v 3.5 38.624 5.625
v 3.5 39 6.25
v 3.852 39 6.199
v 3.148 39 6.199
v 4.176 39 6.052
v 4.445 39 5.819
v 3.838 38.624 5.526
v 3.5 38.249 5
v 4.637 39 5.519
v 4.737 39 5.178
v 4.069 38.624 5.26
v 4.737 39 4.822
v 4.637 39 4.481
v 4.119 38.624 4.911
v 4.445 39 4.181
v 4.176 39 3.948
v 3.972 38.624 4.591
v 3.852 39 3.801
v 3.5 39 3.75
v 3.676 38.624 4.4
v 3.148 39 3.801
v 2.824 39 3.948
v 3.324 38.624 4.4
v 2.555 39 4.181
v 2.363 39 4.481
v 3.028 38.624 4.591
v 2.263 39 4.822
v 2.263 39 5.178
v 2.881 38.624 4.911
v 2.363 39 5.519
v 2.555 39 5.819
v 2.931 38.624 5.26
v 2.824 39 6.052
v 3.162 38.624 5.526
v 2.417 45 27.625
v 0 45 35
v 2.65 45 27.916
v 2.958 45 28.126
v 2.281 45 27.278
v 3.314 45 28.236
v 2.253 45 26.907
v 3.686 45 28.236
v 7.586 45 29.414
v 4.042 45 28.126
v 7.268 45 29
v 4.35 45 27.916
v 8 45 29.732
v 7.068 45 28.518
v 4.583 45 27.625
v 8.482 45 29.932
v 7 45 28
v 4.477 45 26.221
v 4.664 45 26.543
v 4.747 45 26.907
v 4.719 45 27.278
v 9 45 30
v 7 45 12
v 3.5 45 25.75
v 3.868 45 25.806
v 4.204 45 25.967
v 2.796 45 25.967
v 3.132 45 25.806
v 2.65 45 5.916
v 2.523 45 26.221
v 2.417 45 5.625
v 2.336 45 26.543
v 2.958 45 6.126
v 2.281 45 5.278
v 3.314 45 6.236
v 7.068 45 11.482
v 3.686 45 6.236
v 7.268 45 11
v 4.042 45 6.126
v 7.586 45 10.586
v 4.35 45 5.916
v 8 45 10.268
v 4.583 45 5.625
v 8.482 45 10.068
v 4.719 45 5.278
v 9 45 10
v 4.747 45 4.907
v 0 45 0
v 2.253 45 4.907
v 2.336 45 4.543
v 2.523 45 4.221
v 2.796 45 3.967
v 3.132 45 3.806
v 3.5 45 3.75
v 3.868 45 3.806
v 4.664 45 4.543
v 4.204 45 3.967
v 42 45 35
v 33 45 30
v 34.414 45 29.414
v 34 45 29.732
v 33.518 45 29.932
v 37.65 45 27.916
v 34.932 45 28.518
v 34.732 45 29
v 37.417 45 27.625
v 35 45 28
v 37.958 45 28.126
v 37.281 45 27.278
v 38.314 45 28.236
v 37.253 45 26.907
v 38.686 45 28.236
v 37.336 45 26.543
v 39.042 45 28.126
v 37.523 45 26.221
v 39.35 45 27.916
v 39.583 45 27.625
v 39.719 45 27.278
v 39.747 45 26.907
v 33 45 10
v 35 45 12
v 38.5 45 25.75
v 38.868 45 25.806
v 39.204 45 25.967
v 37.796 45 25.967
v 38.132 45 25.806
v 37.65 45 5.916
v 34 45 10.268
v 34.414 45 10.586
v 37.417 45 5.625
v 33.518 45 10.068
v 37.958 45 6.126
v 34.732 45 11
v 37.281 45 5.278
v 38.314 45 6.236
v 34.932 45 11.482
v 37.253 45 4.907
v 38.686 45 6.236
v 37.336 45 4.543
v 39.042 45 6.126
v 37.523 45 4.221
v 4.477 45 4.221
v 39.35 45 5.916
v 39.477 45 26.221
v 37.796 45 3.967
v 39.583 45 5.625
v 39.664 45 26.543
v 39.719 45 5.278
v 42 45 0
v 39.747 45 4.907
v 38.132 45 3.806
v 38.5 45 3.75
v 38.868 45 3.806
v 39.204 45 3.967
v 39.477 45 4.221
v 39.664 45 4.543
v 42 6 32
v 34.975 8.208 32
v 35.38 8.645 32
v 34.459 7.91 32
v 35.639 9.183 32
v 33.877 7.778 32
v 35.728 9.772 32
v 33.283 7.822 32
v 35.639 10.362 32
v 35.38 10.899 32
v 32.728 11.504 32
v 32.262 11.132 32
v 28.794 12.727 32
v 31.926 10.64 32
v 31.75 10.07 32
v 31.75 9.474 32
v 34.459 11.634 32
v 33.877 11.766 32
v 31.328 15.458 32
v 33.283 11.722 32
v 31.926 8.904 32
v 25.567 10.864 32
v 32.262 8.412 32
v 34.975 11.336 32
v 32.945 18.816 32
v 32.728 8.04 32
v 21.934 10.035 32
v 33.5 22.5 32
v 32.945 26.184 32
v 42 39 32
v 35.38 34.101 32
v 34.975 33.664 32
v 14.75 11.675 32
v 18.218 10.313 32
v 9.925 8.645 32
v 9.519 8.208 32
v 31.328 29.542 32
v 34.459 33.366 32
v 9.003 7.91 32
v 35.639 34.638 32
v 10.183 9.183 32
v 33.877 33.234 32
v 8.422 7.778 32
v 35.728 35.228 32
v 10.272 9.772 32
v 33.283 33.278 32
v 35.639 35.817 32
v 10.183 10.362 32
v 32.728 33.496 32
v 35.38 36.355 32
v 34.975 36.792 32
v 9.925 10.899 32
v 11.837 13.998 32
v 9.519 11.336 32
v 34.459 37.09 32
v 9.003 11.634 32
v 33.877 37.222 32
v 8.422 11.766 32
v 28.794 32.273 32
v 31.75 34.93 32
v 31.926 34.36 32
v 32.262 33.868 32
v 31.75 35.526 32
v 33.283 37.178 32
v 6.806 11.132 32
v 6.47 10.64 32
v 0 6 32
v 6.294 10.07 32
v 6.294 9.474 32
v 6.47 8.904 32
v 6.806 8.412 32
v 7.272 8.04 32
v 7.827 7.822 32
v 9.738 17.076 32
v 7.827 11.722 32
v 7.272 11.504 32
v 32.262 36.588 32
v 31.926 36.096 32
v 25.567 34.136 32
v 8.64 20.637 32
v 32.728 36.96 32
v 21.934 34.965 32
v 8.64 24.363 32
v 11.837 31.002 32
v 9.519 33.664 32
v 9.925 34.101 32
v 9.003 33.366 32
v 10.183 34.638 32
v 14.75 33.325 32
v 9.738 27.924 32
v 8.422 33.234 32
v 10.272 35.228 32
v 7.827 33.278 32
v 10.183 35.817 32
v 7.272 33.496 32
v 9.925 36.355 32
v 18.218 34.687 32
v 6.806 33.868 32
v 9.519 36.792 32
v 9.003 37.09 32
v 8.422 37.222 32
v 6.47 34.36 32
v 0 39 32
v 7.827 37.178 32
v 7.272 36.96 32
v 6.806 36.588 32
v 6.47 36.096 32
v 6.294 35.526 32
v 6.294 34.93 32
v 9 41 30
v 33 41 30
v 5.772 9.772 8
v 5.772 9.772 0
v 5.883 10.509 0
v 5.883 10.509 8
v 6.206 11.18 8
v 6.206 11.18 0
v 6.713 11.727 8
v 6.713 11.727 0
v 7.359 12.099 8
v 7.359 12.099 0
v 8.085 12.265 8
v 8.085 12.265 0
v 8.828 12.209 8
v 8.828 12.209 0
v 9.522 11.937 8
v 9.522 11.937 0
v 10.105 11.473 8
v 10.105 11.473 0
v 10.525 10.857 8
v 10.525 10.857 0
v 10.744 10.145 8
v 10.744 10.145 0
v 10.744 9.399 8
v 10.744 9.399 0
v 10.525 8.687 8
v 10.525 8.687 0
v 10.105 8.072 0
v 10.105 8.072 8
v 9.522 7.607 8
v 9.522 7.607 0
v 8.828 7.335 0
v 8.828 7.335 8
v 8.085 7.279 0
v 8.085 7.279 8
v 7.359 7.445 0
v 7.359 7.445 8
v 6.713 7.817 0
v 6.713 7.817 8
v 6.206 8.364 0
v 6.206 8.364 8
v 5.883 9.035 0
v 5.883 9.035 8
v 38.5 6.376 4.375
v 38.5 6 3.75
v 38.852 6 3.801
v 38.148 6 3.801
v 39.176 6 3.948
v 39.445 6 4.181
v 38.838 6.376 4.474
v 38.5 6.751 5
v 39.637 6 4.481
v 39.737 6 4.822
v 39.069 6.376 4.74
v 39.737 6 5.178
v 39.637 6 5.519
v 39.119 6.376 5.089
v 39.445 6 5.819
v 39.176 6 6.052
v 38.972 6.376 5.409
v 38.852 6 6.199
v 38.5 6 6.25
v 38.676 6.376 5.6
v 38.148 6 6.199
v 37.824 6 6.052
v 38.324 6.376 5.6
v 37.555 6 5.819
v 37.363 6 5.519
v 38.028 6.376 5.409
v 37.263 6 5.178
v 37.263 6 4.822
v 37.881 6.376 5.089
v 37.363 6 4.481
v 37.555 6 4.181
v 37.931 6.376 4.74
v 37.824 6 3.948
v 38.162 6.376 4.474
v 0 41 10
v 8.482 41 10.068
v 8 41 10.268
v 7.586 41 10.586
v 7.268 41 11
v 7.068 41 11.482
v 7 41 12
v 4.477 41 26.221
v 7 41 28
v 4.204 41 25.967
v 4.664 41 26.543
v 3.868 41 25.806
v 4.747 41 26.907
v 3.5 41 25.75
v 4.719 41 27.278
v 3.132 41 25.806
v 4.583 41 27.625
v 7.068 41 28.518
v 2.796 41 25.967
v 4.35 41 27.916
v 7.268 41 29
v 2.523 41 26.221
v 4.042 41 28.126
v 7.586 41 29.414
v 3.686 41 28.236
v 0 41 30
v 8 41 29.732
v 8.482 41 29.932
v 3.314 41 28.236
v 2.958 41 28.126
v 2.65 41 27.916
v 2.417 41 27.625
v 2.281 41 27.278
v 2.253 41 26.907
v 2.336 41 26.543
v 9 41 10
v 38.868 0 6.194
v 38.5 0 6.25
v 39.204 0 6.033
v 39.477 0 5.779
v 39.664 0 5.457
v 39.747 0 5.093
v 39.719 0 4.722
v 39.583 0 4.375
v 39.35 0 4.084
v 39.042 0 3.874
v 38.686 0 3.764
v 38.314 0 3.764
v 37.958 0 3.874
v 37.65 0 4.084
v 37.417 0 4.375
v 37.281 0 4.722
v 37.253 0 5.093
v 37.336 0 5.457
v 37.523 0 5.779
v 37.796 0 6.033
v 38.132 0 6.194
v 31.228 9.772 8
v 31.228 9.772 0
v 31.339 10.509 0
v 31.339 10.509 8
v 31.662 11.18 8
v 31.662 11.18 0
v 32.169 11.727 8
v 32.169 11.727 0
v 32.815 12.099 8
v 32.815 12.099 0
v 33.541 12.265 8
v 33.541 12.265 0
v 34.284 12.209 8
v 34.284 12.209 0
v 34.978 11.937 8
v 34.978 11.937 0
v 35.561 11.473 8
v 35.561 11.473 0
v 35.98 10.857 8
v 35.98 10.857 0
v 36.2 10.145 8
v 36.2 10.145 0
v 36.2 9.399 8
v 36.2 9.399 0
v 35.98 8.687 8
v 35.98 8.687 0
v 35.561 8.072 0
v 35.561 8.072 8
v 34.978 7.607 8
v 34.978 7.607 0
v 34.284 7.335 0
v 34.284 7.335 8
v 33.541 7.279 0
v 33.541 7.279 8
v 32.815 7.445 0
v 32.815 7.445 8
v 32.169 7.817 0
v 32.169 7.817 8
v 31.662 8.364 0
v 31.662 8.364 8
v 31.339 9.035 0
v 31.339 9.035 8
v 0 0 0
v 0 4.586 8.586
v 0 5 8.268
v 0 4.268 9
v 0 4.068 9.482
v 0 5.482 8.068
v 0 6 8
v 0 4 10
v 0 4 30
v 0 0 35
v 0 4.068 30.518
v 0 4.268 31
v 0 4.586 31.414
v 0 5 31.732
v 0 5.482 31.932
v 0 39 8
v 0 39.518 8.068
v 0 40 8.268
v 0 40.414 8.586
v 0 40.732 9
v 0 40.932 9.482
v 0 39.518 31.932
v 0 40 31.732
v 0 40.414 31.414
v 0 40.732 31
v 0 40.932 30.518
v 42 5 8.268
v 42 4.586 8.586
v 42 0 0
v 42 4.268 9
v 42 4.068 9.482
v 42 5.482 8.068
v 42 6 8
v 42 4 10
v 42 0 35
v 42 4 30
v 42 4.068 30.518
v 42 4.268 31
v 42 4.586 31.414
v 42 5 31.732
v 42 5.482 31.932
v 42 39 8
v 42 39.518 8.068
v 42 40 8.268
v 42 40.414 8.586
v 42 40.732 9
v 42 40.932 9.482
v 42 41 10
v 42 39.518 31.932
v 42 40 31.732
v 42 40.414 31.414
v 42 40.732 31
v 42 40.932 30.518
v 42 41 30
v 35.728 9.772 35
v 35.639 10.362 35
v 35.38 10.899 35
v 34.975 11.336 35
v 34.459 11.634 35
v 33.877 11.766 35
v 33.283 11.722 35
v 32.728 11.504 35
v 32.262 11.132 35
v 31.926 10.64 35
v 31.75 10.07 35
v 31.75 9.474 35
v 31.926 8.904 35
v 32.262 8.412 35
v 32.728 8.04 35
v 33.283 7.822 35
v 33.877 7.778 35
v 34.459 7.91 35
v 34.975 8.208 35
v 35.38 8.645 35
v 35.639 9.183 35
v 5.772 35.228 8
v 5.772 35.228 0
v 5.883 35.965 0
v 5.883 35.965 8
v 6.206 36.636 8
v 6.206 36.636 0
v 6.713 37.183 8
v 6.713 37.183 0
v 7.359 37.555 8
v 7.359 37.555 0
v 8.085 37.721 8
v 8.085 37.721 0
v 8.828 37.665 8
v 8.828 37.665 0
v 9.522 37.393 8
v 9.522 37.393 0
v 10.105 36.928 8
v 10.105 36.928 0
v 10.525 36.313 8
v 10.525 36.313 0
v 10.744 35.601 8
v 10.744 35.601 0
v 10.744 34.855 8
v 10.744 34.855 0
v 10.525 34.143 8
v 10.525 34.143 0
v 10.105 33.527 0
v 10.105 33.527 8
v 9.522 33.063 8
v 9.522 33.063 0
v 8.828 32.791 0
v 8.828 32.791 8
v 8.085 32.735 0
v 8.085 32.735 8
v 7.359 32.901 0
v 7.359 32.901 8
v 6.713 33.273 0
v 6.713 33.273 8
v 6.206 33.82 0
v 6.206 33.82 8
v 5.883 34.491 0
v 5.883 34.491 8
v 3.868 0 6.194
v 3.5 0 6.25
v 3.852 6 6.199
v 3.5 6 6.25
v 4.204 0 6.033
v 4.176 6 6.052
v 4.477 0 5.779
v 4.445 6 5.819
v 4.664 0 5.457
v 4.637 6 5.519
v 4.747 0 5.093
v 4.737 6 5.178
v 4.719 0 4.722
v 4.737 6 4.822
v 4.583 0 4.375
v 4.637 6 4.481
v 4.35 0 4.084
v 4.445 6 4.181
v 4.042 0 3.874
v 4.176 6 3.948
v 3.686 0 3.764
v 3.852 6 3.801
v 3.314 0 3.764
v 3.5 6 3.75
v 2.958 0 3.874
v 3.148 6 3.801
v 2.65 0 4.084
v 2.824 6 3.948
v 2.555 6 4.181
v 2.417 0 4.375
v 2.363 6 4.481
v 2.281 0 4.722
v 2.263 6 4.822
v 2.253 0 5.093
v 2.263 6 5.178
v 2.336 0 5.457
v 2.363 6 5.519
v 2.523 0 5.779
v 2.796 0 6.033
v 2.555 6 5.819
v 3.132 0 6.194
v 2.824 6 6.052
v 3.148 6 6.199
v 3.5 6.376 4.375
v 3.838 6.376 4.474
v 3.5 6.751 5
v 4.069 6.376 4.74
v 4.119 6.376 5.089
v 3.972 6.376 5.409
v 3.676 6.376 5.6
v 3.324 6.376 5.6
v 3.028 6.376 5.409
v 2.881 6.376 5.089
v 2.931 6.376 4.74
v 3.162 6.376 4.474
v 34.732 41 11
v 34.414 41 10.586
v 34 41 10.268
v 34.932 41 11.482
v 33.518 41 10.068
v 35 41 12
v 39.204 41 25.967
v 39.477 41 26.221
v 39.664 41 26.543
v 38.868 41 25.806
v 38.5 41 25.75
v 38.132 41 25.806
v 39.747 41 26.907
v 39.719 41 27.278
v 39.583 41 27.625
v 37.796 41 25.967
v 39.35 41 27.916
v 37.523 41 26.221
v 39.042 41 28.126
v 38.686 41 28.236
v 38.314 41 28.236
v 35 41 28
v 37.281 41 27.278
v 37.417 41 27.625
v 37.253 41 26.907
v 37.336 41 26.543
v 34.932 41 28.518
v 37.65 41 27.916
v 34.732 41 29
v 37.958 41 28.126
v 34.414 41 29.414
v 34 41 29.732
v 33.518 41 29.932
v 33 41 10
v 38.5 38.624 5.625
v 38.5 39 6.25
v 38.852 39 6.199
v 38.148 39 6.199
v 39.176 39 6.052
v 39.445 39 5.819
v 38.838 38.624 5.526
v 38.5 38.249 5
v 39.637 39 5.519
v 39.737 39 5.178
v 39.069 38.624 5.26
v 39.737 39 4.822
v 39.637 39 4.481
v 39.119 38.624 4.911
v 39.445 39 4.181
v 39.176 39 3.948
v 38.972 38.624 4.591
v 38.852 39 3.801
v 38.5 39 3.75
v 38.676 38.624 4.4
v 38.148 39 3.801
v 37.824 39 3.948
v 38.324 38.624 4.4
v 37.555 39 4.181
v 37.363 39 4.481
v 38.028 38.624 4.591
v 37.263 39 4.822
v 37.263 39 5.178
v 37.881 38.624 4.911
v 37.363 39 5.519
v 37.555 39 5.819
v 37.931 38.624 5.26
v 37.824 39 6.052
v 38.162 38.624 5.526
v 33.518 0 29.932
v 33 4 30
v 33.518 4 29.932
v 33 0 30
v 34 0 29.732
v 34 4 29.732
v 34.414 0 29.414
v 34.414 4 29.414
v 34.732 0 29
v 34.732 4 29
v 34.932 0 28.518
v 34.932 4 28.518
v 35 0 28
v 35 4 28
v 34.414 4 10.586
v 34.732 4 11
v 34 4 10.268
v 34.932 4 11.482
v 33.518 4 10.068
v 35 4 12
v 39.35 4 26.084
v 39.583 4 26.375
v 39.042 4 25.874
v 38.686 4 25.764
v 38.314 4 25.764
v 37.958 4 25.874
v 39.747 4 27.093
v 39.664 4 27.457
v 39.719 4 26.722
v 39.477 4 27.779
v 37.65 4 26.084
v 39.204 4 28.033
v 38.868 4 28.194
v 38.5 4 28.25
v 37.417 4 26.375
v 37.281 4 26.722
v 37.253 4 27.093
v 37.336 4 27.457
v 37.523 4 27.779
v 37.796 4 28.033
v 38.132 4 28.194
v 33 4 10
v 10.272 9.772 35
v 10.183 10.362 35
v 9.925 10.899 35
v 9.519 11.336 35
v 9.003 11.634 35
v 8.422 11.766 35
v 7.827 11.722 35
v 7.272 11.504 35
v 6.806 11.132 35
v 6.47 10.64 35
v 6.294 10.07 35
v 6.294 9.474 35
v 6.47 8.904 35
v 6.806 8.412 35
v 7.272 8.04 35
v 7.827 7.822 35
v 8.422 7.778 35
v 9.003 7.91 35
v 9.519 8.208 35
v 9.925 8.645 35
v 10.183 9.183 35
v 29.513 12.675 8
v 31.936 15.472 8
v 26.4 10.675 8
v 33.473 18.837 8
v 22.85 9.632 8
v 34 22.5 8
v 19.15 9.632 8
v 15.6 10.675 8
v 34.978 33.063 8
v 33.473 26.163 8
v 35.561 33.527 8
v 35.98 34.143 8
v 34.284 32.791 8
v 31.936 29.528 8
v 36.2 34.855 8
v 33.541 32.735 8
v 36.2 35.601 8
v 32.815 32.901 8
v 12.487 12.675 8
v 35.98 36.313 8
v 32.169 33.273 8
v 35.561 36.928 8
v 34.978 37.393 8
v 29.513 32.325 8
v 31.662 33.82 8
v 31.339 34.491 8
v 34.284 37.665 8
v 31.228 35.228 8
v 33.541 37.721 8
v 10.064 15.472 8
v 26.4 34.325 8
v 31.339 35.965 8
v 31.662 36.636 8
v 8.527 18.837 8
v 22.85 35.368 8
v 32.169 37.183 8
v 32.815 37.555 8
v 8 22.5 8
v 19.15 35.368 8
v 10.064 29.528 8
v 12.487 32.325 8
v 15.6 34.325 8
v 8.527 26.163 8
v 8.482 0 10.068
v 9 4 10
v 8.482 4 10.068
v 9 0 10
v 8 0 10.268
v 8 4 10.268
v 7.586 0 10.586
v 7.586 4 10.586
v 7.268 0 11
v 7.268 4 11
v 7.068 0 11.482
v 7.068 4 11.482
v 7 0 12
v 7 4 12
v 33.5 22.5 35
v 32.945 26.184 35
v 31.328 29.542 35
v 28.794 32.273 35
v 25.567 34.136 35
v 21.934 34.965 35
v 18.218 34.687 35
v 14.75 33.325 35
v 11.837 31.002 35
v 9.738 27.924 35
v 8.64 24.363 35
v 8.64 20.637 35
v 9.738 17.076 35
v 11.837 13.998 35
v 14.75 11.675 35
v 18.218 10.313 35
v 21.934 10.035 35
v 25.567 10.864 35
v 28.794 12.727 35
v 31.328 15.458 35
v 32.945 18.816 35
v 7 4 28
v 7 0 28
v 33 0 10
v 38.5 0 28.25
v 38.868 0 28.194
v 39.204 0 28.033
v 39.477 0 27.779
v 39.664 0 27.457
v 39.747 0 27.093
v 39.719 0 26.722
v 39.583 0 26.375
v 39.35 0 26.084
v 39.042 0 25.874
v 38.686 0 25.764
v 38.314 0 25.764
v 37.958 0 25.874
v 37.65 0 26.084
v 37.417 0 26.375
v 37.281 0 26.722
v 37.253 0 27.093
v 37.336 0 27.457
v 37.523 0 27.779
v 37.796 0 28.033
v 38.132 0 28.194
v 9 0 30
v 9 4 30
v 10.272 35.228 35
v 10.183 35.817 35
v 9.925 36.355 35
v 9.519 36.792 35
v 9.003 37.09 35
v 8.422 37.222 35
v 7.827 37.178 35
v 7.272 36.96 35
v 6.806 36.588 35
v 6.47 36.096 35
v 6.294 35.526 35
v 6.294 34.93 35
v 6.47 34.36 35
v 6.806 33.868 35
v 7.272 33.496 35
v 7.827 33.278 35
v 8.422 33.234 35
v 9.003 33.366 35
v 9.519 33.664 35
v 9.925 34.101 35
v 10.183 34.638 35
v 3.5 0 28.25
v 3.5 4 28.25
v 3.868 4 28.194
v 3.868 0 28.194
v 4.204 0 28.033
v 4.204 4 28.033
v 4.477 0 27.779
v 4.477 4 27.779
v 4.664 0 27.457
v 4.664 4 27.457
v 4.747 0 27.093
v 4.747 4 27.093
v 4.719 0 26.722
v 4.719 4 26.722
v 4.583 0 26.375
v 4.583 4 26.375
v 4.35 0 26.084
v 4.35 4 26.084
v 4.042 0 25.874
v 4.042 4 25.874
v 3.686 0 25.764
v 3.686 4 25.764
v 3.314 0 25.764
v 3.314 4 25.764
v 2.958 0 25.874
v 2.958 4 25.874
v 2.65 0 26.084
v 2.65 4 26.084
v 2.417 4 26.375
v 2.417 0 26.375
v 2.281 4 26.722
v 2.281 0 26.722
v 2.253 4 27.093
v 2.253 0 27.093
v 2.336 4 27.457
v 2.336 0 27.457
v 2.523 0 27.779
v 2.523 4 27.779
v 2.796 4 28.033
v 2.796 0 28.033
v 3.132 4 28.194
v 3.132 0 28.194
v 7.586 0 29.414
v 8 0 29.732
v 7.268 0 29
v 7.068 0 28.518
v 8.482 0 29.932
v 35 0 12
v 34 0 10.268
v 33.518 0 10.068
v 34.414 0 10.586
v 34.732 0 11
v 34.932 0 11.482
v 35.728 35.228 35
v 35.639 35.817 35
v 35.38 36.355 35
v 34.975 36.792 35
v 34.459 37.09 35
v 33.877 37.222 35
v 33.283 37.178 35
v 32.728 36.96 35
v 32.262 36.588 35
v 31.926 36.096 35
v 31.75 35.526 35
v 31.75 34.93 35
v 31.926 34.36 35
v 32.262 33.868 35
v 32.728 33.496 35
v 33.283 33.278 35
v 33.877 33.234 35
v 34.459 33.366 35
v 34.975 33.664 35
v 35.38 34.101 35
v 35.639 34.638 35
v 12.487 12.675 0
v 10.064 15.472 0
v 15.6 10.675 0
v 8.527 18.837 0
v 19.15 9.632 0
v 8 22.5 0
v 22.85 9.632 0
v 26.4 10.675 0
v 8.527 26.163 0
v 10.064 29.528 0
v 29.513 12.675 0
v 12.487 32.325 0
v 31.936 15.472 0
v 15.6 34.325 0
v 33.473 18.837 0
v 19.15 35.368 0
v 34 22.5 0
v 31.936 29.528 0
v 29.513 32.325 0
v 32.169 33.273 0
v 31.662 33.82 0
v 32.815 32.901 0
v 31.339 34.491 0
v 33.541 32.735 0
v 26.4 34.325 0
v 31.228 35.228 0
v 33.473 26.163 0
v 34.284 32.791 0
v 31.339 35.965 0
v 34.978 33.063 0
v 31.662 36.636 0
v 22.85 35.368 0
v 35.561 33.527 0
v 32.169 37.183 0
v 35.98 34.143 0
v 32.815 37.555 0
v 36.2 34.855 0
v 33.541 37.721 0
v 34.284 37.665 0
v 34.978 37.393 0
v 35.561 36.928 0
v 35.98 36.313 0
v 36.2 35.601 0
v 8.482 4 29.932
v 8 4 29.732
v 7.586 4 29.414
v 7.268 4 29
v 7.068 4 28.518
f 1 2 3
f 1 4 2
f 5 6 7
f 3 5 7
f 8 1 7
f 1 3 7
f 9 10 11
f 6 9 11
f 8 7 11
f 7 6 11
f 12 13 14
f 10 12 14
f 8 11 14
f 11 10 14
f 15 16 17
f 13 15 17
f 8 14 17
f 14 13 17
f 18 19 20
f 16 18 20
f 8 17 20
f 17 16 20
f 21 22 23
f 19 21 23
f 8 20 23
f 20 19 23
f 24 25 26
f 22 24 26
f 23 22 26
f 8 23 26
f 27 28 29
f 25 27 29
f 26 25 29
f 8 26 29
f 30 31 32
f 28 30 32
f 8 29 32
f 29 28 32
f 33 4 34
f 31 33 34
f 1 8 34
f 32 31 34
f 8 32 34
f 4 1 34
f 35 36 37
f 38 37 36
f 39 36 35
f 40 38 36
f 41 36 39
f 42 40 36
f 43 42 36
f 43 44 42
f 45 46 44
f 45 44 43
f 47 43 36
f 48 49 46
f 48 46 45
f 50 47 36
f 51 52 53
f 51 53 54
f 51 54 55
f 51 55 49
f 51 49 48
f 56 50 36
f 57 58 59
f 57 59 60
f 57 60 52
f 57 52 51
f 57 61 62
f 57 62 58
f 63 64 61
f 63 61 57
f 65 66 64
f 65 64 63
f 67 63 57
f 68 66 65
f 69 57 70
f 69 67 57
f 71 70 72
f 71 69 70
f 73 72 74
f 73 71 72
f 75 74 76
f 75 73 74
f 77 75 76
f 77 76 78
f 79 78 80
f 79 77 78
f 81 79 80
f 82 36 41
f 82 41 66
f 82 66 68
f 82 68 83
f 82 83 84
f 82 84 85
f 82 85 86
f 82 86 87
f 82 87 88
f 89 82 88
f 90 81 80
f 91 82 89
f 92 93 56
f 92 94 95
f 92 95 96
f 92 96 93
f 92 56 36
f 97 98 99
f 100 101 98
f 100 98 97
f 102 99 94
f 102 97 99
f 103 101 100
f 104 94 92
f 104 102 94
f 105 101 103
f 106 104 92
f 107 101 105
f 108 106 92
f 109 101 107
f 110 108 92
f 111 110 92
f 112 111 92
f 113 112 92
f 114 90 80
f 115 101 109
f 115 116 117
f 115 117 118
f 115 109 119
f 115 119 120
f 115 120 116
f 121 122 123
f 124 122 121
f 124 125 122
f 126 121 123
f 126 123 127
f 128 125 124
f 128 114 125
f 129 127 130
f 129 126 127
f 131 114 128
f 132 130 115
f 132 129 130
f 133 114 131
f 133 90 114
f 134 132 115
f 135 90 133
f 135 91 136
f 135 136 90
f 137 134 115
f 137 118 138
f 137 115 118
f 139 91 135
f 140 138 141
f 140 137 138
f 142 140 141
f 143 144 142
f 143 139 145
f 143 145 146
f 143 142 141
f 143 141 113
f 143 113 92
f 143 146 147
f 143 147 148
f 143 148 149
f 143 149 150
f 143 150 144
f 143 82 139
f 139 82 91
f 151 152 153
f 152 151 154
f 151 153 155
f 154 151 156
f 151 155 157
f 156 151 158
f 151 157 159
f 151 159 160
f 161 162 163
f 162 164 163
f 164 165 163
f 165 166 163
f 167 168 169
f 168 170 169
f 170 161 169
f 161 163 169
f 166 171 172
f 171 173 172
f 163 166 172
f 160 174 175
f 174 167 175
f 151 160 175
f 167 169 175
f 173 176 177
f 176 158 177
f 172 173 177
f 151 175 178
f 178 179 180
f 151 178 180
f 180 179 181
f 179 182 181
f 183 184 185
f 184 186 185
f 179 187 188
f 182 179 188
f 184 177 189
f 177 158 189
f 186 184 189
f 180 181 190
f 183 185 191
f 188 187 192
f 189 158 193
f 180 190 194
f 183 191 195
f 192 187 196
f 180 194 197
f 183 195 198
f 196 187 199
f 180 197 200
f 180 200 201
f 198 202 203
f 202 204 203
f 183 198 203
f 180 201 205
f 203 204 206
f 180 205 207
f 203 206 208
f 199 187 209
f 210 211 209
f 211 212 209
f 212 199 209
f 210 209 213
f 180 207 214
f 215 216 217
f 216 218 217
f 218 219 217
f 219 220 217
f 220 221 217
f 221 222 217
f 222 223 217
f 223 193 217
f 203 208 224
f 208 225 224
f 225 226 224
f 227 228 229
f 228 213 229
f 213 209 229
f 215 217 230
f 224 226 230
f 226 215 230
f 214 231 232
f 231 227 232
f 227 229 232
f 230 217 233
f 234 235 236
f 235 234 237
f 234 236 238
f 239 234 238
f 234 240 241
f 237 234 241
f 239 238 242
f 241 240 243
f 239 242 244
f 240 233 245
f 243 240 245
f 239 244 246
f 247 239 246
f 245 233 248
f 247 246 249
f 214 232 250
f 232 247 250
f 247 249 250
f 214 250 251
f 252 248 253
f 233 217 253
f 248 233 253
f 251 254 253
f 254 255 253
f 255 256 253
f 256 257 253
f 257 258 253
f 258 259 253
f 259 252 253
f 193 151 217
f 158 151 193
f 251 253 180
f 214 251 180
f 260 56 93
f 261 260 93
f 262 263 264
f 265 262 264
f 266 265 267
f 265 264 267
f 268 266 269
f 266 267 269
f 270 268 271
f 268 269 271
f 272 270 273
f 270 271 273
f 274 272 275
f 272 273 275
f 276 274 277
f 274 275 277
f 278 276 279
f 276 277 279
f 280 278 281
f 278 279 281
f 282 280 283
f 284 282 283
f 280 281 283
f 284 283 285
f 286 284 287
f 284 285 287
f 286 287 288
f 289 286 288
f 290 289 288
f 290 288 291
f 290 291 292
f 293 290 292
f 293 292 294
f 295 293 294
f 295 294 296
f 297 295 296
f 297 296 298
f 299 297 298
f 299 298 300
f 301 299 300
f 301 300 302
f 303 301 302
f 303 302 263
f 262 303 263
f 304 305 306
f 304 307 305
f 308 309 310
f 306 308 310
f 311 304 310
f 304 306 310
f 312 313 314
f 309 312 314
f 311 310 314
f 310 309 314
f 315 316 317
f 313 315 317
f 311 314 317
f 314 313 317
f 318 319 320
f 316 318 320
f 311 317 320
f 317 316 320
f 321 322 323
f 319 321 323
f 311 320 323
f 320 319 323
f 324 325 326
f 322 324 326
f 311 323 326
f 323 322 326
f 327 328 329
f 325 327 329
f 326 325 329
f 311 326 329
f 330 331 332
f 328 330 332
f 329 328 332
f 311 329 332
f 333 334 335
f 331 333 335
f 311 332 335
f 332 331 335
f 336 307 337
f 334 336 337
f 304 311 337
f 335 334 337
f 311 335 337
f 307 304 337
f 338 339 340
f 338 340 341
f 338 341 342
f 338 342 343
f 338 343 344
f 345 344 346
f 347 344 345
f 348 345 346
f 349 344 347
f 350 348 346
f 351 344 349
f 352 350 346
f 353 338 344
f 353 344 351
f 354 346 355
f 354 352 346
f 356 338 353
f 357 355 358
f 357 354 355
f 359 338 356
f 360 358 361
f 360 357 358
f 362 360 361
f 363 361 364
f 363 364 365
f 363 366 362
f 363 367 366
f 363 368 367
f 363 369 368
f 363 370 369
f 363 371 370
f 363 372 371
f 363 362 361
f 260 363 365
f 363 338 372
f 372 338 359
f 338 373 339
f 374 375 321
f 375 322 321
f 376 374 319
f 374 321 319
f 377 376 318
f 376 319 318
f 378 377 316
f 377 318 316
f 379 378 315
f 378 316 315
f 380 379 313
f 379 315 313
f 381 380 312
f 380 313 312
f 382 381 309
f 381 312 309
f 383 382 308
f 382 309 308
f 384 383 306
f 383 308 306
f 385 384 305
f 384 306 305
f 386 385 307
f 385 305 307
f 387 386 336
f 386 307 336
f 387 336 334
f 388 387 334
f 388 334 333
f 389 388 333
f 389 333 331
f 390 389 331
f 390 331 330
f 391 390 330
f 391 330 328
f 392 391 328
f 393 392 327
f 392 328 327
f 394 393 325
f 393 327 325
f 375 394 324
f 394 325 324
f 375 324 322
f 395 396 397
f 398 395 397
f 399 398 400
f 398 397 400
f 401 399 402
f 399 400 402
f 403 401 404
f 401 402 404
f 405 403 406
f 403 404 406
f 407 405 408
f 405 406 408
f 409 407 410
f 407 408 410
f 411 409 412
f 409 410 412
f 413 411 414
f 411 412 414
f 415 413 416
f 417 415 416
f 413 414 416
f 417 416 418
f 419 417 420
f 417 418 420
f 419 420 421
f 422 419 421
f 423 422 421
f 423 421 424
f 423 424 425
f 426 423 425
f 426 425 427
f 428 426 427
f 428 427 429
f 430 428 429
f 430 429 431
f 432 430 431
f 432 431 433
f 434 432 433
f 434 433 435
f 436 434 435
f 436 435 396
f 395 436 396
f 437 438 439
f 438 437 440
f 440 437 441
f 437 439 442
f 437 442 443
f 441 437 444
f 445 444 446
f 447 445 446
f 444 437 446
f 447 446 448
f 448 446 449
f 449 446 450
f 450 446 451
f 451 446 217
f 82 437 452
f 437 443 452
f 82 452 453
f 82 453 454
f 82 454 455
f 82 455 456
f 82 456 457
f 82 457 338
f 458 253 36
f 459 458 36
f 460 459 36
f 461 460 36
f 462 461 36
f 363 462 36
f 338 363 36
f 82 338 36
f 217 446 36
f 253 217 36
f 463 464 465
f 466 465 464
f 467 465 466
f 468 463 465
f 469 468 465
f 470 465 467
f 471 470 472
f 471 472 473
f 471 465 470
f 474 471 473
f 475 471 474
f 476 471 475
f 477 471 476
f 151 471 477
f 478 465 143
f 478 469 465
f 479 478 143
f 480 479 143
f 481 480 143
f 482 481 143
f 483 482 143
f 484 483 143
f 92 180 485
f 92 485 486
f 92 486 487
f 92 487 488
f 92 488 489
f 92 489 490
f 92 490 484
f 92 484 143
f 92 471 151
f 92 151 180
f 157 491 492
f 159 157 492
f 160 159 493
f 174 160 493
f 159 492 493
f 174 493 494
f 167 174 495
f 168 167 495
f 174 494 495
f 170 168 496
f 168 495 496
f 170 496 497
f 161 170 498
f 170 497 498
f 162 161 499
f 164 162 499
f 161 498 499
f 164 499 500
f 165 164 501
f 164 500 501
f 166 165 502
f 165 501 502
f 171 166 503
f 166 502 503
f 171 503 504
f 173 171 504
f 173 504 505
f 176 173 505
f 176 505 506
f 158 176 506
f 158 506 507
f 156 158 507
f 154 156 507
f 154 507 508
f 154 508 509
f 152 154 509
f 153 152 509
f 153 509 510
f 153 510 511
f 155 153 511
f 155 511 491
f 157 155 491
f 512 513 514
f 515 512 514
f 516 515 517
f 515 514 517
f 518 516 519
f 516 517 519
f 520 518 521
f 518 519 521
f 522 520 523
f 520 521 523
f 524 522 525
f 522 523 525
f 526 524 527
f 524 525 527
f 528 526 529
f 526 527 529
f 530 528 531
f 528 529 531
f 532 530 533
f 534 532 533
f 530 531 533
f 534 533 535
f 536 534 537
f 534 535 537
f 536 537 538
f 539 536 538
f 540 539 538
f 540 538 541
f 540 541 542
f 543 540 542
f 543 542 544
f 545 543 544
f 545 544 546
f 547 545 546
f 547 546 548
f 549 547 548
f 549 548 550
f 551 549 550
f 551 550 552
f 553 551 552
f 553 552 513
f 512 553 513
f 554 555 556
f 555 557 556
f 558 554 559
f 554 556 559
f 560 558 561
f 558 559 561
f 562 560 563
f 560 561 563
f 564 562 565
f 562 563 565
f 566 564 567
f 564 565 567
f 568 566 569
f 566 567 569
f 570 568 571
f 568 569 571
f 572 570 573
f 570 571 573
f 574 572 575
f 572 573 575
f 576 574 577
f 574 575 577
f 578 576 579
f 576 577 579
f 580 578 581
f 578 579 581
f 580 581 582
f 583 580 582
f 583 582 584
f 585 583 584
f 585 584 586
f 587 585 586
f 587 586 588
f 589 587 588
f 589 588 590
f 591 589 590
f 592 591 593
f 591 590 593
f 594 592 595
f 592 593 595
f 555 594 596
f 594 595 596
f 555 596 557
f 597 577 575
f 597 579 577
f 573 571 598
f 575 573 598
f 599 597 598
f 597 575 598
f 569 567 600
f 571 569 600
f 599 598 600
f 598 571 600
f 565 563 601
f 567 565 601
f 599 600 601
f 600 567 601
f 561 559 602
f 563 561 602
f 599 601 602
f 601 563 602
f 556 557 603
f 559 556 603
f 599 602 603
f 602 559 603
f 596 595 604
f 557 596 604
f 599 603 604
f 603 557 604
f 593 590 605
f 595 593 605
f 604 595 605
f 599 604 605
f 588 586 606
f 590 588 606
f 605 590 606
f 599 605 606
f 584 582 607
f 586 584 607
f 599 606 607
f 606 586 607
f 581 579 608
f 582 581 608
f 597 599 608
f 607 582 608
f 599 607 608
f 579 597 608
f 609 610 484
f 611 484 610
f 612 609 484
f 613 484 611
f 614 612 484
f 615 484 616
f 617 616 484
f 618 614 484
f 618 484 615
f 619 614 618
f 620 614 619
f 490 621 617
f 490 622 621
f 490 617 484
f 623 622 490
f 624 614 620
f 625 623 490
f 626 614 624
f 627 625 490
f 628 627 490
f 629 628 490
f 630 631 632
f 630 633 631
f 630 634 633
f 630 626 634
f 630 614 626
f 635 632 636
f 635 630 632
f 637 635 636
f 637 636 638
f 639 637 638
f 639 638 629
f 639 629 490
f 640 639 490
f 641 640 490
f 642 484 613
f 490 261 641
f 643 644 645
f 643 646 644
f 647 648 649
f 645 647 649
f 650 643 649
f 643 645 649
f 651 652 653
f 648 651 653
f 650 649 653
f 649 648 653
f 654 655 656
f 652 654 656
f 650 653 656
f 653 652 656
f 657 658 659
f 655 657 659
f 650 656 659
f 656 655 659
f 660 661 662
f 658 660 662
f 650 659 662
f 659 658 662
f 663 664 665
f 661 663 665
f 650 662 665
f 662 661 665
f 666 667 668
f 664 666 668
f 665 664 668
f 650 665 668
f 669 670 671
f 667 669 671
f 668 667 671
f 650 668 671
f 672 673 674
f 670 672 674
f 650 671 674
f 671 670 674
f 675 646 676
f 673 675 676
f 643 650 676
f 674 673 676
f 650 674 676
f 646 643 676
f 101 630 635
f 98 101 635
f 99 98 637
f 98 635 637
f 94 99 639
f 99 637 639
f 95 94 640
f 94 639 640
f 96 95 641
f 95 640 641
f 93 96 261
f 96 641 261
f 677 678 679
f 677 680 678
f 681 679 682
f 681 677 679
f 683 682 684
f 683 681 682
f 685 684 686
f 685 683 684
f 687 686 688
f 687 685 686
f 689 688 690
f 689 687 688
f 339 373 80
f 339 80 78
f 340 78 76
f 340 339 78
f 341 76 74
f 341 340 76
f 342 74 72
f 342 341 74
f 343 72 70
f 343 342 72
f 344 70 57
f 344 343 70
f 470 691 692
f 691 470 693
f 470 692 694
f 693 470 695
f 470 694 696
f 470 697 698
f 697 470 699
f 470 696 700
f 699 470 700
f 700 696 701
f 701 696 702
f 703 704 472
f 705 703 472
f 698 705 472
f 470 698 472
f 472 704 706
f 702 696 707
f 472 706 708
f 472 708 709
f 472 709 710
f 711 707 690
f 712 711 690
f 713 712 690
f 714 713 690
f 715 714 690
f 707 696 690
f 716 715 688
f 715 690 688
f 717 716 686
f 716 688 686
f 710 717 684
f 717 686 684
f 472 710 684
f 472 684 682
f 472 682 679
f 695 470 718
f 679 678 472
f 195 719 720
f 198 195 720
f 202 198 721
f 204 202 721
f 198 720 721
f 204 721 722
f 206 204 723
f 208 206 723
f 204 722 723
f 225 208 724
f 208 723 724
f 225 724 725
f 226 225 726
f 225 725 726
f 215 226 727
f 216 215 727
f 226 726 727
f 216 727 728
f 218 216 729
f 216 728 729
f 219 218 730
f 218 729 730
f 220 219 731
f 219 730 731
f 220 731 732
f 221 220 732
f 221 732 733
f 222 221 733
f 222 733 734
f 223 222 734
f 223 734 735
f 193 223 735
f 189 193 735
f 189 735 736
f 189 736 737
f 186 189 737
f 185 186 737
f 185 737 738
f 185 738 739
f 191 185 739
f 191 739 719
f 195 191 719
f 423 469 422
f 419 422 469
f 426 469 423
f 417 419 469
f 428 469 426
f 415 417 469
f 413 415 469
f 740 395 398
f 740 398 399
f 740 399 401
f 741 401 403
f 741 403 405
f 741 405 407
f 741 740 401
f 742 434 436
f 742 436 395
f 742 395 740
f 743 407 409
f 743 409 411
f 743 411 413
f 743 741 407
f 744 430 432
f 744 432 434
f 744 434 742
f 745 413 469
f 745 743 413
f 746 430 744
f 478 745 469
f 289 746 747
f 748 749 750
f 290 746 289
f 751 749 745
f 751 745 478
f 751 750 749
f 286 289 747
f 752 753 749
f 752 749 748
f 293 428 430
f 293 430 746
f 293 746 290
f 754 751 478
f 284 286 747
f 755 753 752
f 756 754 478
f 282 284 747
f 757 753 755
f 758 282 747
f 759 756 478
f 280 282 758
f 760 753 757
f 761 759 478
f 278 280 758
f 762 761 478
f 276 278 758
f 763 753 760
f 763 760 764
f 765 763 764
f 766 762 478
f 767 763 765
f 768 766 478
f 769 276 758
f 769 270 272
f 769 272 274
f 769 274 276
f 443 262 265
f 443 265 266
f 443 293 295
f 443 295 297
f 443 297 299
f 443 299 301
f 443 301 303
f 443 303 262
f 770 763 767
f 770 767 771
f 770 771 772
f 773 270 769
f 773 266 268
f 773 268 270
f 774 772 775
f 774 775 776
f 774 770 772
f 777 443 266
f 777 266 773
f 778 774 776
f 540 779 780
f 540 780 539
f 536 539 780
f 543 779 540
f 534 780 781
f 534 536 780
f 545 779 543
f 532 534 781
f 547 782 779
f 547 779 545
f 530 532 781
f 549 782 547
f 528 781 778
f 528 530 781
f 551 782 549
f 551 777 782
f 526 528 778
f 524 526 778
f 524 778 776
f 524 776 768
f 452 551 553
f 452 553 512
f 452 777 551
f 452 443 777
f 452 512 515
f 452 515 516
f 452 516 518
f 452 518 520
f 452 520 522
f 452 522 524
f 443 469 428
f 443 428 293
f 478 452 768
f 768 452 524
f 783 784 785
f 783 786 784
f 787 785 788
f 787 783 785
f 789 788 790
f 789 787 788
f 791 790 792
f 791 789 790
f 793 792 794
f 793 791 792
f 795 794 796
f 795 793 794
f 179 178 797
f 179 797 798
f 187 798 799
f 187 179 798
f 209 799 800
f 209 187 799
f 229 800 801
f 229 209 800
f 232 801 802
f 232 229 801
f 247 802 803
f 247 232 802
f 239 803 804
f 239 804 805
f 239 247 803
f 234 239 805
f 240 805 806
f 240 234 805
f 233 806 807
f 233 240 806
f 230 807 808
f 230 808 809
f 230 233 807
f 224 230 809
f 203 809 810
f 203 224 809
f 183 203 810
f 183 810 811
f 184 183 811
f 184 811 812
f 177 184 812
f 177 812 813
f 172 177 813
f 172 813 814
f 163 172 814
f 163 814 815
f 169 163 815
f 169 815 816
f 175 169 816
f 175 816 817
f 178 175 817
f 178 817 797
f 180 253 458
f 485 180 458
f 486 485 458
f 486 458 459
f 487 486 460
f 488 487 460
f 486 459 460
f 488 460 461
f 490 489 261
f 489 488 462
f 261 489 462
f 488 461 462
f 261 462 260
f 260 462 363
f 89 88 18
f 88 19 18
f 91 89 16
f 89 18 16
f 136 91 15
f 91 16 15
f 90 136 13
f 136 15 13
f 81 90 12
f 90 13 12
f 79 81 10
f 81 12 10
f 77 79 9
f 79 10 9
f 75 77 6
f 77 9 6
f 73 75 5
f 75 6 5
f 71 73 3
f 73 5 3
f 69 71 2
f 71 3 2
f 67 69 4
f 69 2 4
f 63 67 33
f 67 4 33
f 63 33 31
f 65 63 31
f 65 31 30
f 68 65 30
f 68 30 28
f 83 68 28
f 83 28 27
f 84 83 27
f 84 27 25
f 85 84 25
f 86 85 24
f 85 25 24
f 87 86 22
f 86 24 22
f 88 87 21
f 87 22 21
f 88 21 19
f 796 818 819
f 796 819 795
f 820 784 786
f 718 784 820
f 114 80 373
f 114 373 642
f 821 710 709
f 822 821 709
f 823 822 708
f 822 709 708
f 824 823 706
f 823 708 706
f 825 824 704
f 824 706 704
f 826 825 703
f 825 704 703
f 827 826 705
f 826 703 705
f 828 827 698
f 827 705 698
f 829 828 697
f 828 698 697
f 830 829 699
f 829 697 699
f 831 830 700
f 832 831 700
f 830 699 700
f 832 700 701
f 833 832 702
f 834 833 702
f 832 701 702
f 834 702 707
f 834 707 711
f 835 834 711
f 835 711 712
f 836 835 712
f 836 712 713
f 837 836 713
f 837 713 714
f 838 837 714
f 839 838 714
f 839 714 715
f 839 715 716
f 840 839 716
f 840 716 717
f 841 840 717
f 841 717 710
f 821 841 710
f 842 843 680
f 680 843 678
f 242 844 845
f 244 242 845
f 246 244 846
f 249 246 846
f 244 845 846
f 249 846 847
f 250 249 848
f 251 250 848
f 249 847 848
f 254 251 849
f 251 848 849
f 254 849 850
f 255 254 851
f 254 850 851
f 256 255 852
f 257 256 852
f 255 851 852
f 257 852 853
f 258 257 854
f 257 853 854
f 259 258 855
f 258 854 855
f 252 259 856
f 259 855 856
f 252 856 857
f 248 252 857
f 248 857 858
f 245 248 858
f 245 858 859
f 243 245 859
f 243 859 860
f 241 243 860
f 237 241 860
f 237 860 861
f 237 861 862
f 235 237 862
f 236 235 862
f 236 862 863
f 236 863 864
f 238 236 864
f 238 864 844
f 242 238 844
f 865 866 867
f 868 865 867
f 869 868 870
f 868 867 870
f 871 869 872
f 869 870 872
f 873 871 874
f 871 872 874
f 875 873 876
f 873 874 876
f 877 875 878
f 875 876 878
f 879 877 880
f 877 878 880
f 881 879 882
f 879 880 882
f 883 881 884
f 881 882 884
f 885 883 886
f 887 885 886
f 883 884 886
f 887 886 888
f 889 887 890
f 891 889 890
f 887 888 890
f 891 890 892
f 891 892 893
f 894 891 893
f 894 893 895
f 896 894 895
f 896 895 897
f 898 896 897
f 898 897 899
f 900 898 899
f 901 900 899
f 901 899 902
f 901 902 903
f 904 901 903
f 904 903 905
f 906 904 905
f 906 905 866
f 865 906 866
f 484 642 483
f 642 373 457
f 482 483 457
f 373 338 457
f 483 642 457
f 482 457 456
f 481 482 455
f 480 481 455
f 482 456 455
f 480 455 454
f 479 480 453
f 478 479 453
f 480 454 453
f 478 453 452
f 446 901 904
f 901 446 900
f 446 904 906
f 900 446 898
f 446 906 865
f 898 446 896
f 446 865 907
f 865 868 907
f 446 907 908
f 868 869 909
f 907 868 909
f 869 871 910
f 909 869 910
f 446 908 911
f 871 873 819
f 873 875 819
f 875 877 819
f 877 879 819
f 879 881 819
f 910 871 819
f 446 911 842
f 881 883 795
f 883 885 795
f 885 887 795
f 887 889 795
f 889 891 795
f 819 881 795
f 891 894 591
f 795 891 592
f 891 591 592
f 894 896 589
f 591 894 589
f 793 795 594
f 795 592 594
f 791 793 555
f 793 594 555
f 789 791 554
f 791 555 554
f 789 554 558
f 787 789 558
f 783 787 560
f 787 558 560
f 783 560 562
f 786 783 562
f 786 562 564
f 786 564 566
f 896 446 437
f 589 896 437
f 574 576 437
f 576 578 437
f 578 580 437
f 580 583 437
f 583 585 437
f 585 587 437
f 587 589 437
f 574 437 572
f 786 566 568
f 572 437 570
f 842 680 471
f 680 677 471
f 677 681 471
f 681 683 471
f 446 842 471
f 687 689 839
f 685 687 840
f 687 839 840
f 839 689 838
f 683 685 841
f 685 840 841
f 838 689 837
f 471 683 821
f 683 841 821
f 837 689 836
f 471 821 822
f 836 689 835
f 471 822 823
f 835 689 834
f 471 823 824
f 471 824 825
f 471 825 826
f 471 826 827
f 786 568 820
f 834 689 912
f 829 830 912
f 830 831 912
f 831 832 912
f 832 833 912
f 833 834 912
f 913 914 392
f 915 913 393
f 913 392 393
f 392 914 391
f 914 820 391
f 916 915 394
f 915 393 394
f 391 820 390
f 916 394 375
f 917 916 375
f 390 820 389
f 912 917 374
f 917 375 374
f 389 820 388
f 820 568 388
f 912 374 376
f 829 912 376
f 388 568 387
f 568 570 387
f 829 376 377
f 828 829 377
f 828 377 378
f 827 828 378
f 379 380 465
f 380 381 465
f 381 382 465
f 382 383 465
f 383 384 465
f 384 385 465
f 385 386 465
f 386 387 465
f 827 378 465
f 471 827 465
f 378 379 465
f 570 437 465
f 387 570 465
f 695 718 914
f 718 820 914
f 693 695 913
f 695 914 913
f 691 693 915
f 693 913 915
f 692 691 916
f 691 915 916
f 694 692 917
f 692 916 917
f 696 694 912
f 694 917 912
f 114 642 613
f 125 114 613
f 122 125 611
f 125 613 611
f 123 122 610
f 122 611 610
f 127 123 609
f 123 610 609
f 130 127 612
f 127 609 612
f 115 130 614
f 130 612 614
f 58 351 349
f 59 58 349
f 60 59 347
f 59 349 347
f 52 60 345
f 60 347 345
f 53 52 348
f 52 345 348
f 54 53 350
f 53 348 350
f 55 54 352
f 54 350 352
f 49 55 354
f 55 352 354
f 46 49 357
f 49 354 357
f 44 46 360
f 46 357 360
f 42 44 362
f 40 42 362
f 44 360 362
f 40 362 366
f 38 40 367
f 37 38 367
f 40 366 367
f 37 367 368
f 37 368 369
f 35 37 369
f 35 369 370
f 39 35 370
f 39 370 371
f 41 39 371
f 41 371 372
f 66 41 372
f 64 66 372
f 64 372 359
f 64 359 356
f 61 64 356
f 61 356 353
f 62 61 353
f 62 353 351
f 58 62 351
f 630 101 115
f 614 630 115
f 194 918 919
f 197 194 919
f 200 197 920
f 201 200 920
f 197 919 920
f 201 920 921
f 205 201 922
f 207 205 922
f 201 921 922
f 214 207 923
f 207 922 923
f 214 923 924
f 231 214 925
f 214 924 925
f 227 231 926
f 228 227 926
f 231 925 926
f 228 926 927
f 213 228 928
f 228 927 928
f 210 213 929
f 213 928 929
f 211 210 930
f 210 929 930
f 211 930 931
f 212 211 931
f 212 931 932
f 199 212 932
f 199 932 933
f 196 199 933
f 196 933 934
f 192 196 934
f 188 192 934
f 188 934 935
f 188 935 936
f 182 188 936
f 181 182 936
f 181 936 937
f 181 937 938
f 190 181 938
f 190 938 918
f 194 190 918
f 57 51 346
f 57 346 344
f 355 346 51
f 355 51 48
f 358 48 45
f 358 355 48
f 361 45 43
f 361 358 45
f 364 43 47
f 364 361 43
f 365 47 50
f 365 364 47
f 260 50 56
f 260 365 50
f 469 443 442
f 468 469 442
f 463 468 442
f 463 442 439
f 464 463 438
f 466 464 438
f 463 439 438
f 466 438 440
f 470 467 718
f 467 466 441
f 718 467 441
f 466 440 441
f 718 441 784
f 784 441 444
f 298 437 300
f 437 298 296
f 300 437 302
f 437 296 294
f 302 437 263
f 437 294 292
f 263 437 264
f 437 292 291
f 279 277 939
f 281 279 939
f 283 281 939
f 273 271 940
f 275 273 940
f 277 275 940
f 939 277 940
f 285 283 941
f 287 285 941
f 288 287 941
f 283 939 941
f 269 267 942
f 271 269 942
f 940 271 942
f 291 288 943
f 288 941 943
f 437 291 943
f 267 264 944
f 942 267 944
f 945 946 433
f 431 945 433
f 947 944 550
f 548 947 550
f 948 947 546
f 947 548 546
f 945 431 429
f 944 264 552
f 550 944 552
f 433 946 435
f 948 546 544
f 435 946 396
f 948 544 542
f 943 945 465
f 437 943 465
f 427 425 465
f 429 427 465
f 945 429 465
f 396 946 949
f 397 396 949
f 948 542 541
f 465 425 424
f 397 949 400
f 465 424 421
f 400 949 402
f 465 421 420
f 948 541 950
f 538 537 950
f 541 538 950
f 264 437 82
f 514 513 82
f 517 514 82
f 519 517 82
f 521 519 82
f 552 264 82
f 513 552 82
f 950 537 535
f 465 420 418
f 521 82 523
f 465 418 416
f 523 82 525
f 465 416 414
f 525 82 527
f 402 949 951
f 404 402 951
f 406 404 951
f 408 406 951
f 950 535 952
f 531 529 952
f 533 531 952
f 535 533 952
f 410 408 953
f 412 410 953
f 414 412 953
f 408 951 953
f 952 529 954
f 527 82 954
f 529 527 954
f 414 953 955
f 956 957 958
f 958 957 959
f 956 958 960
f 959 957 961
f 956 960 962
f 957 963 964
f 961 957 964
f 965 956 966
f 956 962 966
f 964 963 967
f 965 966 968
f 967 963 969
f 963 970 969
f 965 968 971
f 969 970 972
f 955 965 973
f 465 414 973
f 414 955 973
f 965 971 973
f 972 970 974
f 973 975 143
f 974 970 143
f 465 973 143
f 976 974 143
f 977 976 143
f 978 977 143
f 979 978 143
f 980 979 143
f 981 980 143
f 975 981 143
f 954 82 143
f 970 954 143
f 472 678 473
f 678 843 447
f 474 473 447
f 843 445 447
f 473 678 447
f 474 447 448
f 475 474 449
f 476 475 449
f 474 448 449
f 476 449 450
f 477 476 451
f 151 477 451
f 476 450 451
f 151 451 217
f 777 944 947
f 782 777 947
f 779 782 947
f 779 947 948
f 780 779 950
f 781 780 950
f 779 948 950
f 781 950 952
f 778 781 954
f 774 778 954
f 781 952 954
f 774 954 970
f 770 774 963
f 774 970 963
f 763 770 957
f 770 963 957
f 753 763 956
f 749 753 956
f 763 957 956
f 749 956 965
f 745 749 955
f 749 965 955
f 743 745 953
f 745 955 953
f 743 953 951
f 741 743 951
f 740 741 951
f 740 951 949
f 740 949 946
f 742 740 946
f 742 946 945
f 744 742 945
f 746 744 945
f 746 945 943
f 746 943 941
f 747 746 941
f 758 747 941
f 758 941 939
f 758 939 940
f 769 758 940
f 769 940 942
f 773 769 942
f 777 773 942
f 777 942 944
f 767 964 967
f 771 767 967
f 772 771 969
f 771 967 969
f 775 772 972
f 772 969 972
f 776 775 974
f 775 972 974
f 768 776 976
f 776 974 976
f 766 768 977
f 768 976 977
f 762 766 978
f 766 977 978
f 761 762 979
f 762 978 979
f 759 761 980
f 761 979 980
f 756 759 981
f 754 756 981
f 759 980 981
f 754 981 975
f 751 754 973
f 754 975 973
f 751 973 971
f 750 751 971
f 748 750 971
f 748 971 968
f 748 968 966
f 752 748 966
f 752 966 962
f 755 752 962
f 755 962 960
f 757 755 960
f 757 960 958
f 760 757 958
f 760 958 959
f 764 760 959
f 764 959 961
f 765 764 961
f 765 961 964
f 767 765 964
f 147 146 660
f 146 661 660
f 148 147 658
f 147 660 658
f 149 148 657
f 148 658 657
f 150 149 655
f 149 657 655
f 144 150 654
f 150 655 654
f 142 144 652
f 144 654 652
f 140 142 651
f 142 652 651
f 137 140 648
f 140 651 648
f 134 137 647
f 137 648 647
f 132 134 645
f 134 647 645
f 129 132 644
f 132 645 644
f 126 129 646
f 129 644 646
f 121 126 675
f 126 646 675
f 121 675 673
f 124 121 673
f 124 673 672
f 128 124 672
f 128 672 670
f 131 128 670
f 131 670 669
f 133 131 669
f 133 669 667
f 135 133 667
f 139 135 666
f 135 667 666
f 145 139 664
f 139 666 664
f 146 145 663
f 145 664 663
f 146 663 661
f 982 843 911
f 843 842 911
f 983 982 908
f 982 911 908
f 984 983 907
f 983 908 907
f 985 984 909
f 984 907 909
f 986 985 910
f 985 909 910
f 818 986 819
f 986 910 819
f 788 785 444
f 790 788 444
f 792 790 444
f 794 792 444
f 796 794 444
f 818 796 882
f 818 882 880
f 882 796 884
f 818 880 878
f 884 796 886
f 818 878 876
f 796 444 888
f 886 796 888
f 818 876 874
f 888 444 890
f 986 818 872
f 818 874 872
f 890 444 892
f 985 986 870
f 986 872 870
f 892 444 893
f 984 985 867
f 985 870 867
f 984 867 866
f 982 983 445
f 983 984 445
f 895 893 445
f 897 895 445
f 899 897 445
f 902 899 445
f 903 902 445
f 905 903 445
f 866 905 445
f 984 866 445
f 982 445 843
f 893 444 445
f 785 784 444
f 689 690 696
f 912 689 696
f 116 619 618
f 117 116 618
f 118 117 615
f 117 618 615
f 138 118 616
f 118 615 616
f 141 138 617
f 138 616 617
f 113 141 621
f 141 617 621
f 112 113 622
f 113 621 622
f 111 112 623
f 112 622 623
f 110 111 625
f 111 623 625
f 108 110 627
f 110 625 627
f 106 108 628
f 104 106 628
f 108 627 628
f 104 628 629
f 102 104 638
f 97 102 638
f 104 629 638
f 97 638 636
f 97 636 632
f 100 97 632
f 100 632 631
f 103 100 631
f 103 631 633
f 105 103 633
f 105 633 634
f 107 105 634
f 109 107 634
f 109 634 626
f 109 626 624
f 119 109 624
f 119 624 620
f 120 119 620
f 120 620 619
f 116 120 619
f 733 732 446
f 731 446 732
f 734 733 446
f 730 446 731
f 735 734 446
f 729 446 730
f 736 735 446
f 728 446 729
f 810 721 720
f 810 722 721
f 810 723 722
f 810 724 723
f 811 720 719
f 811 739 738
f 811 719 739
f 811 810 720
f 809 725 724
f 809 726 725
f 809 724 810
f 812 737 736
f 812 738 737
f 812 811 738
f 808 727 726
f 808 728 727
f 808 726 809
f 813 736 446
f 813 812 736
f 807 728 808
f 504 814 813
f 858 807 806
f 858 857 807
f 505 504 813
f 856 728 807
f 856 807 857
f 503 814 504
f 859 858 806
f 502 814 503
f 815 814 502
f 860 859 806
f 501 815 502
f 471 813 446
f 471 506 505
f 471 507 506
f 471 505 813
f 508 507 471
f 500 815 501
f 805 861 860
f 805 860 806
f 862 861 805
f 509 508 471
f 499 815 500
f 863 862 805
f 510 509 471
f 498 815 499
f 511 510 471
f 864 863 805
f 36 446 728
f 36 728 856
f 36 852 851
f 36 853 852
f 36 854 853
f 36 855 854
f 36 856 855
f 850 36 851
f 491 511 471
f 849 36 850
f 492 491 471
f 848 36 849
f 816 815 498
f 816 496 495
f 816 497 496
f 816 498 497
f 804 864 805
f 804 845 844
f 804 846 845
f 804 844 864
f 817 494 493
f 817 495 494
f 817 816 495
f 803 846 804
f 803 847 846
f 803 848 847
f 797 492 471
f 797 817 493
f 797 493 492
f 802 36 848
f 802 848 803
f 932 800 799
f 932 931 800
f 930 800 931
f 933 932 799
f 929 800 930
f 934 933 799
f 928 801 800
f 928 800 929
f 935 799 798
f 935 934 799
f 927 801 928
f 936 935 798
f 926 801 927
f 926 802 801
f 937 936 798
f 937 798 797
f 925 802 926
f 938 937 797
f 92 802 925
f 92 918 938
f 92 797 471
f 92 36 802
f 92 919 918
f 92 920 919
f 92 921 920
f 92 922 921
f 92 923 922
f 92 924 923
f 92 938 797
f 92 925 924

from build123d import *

# Parameters (mm, degrees)
SKETCH_1_W             = 42
SKETCH_1_H             = 45
SKETCH_1_R             = 12.5
EXTRUDE_1_DEPTH        = 35
SKETCH_3_W             = 24
SKETCH_3_H             = 37
CUT_EXTRUDE_1_DEPTH    = 71.809603868
HOLE_WIZARD_M3_2_D     = 2.5
HOLE_WIZARD_M3_2_DEPTH = 6
HOLE_WIZARD_M3_2_TIP   = 0.751075774
HOLE_WIZARD_M3_4_D     = 2.5
HOLE_WIZARD_M3_4_DEPTH = 6
HOLE_WIZARD_M3_4_TIP   = 0.751075774
SKETCH_18_W            = 28
SKETCH_18_H            = 20
CUT_EXTRUDE_8_DEPTH    = 71.809603868
SKETCH_13_R            = 2
CUT_EXTRUDE_10_DEPTH   = 71.809603868
FILLET_3_DEPTH         = 42
FILLET_7_R             = 2
CUT_EXTRUDE_9_REACH    = 72.81
SKETCH_12_R            = 13
SKETCH_12_R_2          = 12.5
SKETCH_12_R_3          = 2.5


with BuildPart() as part:
    # 草图1 → 凸台-拉伸1 (new body)
    with BuildSketch(Plane.XY):
        with Locations((21, 22.5)):
            Rectangle(SKETCH_1_W, SKETCH_1_H)
        with Locations((21, 22.5)):
            Circle(SKETCH_1_R, mode=Mode.SUBTRACT)
    extrude(amount=EXTRUDE_1_DEPTH)

    # 草图3 → 切除-拉伸1 (cut, through all)
    with BuildSketch(Plane.ZY):
        with Locations((20, 22.5)):
            Rectangle(SKETCH_3_W, SKETCH_3_H)
    extrude(amount=-CUT_EXTRUDE_1_DEPTH, mode=Mode.SUBTRACT)

    # M3 螺纹孔2
    with Locations(Plane(origin=(3.5, 45, 5), x_dir=(0, 0, 1), z_dir=(0, 1, 0))):
        with Locations((0, 0), (0, 35), (22, 35), (22, 0)):
            Hole(HOLE_WIZARD_M3_2_D / 2, depth=HOLE_WIZARD_M3_2_DEPTH)
            with Locations((0, 0, -(HOLE_WIZARD_M3_2_DEPTH + HOLE_WIZARD_M3_2_TIP / 2))):  # 118° drill point
                Cone(0, HOLE_WIZARD_M3_2_D / 2, HOLE_WIZARD_M3_2_TIP, mode=Mode.SUBTRACT)

    # M3 螺纹孔4
    with Locations(Plane(origin=(3.5, 0, 5), x_dir=(0, 0, -1), z_dir=(0, -1, 0))):
        with Locations((0, 0), (-22, 0), (-22, 35), (0, 35)):
            Hole(HOLE_WIZARD_M3_4_D / 2, depth=HOLE_WIZARD_M3_4_DEPTH)
            with Locations((0, 0, -(HOLE_WIZARD_M3_4_DEPTH + HOLE_WIZARD_M3_4_TIP / 2))):  # 118° drill point
                Cone(0, HOLE_WIZARD_M3_4_D / 2, HOLE_WIZARD_M3_4_TIP, mode=Mode.SUBTRACT)

    # 草图18 → 切除-拉伸8 (cut, through all)
    with BuildSketch(Plane(origin=(0, 45, 0), x_dir=(1, 0, 0), z_dir=(0, 1, 0))):
        with Locations((21, -20)):
            Rectangle(SKETCH_18_W, SKETCH_18_H)
    extrude(amount=-CUT_EXTRUDE_8_DEPTH, mode=Mode.SUBTRACT)

    # 草图13 → 切除-拉伸10 (cut, through all)
    with BuildSketch(Plane.XY.offset(35)):
        with Locations((33.727922061, 9.772077939)):
            Circle(SKETCH_13_R)
        with Locations((33.727922061, 35.227922061)):
            Circle(SKETCH_13_R)
        with Locations((8.272077939, 35.227922061)):
            Circle(SKETCH_13_R)
        with Locations((8.272077939, 9.772077939)):
            Circle(SKETCH_13_R)
    extrude(amount=-CUT_EXTRUDE_10_DEPTH, mode=Mode.SUBTRACT)

    # 圆角3: read off the stored shape, not the designer's step
    # 圆角3 outline → 圆角3 (add)
    with BuildSketch(Plane.YZ):
        with BuildLine():
            ThreePointArc((41, 10), (40.414213562, 8.585786438), (39, 8))
            Line((39, 8), (41, 8))
            Line((41, 8), (41, 10))
        make_face()
        with BuildLine():
            Line((4, 8), (6, 8))
            ThreePointArc((6, 8), (4.585786438, 8.585786438), (4, 10))
            Line((4, 10), (4, 8))
        make_face()
        with BuildLine():
            ThreePointArc((39, 32), (40.414213562, 31.414213562), (41, 30))
            Line((41, 30), (41, 32))
            Line((41, 32), (39, 32))
        make_face()
        with BuildLine():
            Line((4, 32), (4, 30))
            ThreePointArc((4, 30), (4.585786438, 31.414213562), (6, 32))
            Line((6, 32), (4, 32))
        make_face()
    extrude(amount=FILLET_3_DEPTH)

    # 圆角7
    fillet_7_edges = [part.edges().sort_by_distance(p)[0] for p in [
        (35, 2, 10),
        (35, 43, 10),
        (35, 2, 30),
        (35, 43, 30),
        (7, 2, 30),
        (7, 43, 30),
        (7, 2, 10),
        (7, 43, 10),
    ]]
    fillet(fillet_7_edges, radius=FILLET_7_R)

    # 草图12 → 切除-拉伸9 (cut, up to next)
    with BuildSketch(Plane(origin=(0, 0, 0), x_dir=(-1, 0, 0), z_dir=(0, 0, -1)), mode=Mode.PRIVATE) as cut_extrude_9_sk1:
        with Locations((-21, 22.5)):
            Circle(SKETCH_12_R)
        with Locations(Location((-21, 22.5, 0), (0, 0, 180))):
            Circle(SKETCH_12_R_2, mode=Mode.SUBTRACT)
    cut_extrude_9_tool1 = extrude(cut_extrude_9_sk1.sketch, amount=-CUT_EXTRUDE_9_REACH, mode=Mode.PRIVATE) & part.part
    # 草图12 → 切除-拉伸9 (cut, up to next)
    with BuildSketch(Plane(origin=(0, 0, 0), x_dir=(-1, 0, 0), z_dir=(0, 0, -1)), mode=Mode.PRIVATE) as cut_extrude_9_sk2:
        with Locations((-8.272077939, 35.227922061)):
            Circle(SKETCH_12_R_3)
    cut_extrude_9_tool2 = extrude(cut_extrude_9_sk2.sketch, amount=-CUT_EXTRUDE_9_REACH, mode=Mode.PRIVATE) & part.part
    # 草图12 → 切除-拉伸9 (cut, up to next)
    with BuildSketch(Plane(origin=(0, 0, 0), x_dir=(-1, 0, 0), z_dir=(0, 0, -1)), mode=Mode.PRIVATE) as cut_extrude_9_sk3:
        with Locations((-8.272077939, 9.772077939)):
            Circle(SKETCH_12_R_3)
    cut_extrude_9_tool3 = extrude(cut_extrude_9_sk3.sketch, amount=-CUT_EXTRUDE_9_REACH, mode=Mode.PRIVATE) & part.part
    # 草图12 → 切除-拉伸9 (cut, up to next)
    with BuildSketch(Plane(origin=(0, 0, 0), x_dir=(-1, 0, 0), z_dir=(0, 0, -1)), mode=Mode.PRIVATE) as cut_extrude_9_sk4:
        with Locations((-33.727922061, 9.772077939)):
            Circle(SKETCH_12_R_3)
    cut_extrude_9_tool4 = extrude(cut_extrude_9_sk4.sketch, amount=-CUT_EXTRUDE_9_REACH, mode=Mode.PRIVATE) & part.part
    # 草图12 → 切除-拉伸9 (cut, up to next)
    with BuildSketch(Plane(origin=(0, 0, 0), x_dir=(-1, 0, 0), z_dir=(0, 0, -1)), mode=Mode.PRIVATE) as cut_extrude_9_sk5:
        with Locations((-33.727922061, 35.227922061)):
            Circle(SKETCH_12_R_3)
    cut_extrude_9_tool5 = extrude(cut_extrude_9_sk5.sketch, amount=-CUT_EXTRUDE_9_REACH, mode=Mode.PRIVATE) & part.part
    add(cut_extrude_9_tool1.solids().sort_by_distance((33.632304, 22.5, 0))[0], mode=Mode.SUBTRACT)
    add(cut_extrude_9_tool2.solids().sort_by_distance((8.272078, 35.227922, 0))[0], mode=Mode.SUBTRACT)
    add(cut_extrude_9_tool3.solids().sort_by_distance((8.272078, 9.772078, 0))[0], mode=Mode.SUBTRACT)
    add(cut_extrude_9_tool4.solids().sort_by_distance((33.727922, 9.772078, 0))[0], mode=Mode.SUBTRACT)
    add(cut_extrude_9_tool5.solids().sort_by_distance((33.727922, 35.227922, 0))[0], mode=Mode.SUBTRACT)


solid = part.part
